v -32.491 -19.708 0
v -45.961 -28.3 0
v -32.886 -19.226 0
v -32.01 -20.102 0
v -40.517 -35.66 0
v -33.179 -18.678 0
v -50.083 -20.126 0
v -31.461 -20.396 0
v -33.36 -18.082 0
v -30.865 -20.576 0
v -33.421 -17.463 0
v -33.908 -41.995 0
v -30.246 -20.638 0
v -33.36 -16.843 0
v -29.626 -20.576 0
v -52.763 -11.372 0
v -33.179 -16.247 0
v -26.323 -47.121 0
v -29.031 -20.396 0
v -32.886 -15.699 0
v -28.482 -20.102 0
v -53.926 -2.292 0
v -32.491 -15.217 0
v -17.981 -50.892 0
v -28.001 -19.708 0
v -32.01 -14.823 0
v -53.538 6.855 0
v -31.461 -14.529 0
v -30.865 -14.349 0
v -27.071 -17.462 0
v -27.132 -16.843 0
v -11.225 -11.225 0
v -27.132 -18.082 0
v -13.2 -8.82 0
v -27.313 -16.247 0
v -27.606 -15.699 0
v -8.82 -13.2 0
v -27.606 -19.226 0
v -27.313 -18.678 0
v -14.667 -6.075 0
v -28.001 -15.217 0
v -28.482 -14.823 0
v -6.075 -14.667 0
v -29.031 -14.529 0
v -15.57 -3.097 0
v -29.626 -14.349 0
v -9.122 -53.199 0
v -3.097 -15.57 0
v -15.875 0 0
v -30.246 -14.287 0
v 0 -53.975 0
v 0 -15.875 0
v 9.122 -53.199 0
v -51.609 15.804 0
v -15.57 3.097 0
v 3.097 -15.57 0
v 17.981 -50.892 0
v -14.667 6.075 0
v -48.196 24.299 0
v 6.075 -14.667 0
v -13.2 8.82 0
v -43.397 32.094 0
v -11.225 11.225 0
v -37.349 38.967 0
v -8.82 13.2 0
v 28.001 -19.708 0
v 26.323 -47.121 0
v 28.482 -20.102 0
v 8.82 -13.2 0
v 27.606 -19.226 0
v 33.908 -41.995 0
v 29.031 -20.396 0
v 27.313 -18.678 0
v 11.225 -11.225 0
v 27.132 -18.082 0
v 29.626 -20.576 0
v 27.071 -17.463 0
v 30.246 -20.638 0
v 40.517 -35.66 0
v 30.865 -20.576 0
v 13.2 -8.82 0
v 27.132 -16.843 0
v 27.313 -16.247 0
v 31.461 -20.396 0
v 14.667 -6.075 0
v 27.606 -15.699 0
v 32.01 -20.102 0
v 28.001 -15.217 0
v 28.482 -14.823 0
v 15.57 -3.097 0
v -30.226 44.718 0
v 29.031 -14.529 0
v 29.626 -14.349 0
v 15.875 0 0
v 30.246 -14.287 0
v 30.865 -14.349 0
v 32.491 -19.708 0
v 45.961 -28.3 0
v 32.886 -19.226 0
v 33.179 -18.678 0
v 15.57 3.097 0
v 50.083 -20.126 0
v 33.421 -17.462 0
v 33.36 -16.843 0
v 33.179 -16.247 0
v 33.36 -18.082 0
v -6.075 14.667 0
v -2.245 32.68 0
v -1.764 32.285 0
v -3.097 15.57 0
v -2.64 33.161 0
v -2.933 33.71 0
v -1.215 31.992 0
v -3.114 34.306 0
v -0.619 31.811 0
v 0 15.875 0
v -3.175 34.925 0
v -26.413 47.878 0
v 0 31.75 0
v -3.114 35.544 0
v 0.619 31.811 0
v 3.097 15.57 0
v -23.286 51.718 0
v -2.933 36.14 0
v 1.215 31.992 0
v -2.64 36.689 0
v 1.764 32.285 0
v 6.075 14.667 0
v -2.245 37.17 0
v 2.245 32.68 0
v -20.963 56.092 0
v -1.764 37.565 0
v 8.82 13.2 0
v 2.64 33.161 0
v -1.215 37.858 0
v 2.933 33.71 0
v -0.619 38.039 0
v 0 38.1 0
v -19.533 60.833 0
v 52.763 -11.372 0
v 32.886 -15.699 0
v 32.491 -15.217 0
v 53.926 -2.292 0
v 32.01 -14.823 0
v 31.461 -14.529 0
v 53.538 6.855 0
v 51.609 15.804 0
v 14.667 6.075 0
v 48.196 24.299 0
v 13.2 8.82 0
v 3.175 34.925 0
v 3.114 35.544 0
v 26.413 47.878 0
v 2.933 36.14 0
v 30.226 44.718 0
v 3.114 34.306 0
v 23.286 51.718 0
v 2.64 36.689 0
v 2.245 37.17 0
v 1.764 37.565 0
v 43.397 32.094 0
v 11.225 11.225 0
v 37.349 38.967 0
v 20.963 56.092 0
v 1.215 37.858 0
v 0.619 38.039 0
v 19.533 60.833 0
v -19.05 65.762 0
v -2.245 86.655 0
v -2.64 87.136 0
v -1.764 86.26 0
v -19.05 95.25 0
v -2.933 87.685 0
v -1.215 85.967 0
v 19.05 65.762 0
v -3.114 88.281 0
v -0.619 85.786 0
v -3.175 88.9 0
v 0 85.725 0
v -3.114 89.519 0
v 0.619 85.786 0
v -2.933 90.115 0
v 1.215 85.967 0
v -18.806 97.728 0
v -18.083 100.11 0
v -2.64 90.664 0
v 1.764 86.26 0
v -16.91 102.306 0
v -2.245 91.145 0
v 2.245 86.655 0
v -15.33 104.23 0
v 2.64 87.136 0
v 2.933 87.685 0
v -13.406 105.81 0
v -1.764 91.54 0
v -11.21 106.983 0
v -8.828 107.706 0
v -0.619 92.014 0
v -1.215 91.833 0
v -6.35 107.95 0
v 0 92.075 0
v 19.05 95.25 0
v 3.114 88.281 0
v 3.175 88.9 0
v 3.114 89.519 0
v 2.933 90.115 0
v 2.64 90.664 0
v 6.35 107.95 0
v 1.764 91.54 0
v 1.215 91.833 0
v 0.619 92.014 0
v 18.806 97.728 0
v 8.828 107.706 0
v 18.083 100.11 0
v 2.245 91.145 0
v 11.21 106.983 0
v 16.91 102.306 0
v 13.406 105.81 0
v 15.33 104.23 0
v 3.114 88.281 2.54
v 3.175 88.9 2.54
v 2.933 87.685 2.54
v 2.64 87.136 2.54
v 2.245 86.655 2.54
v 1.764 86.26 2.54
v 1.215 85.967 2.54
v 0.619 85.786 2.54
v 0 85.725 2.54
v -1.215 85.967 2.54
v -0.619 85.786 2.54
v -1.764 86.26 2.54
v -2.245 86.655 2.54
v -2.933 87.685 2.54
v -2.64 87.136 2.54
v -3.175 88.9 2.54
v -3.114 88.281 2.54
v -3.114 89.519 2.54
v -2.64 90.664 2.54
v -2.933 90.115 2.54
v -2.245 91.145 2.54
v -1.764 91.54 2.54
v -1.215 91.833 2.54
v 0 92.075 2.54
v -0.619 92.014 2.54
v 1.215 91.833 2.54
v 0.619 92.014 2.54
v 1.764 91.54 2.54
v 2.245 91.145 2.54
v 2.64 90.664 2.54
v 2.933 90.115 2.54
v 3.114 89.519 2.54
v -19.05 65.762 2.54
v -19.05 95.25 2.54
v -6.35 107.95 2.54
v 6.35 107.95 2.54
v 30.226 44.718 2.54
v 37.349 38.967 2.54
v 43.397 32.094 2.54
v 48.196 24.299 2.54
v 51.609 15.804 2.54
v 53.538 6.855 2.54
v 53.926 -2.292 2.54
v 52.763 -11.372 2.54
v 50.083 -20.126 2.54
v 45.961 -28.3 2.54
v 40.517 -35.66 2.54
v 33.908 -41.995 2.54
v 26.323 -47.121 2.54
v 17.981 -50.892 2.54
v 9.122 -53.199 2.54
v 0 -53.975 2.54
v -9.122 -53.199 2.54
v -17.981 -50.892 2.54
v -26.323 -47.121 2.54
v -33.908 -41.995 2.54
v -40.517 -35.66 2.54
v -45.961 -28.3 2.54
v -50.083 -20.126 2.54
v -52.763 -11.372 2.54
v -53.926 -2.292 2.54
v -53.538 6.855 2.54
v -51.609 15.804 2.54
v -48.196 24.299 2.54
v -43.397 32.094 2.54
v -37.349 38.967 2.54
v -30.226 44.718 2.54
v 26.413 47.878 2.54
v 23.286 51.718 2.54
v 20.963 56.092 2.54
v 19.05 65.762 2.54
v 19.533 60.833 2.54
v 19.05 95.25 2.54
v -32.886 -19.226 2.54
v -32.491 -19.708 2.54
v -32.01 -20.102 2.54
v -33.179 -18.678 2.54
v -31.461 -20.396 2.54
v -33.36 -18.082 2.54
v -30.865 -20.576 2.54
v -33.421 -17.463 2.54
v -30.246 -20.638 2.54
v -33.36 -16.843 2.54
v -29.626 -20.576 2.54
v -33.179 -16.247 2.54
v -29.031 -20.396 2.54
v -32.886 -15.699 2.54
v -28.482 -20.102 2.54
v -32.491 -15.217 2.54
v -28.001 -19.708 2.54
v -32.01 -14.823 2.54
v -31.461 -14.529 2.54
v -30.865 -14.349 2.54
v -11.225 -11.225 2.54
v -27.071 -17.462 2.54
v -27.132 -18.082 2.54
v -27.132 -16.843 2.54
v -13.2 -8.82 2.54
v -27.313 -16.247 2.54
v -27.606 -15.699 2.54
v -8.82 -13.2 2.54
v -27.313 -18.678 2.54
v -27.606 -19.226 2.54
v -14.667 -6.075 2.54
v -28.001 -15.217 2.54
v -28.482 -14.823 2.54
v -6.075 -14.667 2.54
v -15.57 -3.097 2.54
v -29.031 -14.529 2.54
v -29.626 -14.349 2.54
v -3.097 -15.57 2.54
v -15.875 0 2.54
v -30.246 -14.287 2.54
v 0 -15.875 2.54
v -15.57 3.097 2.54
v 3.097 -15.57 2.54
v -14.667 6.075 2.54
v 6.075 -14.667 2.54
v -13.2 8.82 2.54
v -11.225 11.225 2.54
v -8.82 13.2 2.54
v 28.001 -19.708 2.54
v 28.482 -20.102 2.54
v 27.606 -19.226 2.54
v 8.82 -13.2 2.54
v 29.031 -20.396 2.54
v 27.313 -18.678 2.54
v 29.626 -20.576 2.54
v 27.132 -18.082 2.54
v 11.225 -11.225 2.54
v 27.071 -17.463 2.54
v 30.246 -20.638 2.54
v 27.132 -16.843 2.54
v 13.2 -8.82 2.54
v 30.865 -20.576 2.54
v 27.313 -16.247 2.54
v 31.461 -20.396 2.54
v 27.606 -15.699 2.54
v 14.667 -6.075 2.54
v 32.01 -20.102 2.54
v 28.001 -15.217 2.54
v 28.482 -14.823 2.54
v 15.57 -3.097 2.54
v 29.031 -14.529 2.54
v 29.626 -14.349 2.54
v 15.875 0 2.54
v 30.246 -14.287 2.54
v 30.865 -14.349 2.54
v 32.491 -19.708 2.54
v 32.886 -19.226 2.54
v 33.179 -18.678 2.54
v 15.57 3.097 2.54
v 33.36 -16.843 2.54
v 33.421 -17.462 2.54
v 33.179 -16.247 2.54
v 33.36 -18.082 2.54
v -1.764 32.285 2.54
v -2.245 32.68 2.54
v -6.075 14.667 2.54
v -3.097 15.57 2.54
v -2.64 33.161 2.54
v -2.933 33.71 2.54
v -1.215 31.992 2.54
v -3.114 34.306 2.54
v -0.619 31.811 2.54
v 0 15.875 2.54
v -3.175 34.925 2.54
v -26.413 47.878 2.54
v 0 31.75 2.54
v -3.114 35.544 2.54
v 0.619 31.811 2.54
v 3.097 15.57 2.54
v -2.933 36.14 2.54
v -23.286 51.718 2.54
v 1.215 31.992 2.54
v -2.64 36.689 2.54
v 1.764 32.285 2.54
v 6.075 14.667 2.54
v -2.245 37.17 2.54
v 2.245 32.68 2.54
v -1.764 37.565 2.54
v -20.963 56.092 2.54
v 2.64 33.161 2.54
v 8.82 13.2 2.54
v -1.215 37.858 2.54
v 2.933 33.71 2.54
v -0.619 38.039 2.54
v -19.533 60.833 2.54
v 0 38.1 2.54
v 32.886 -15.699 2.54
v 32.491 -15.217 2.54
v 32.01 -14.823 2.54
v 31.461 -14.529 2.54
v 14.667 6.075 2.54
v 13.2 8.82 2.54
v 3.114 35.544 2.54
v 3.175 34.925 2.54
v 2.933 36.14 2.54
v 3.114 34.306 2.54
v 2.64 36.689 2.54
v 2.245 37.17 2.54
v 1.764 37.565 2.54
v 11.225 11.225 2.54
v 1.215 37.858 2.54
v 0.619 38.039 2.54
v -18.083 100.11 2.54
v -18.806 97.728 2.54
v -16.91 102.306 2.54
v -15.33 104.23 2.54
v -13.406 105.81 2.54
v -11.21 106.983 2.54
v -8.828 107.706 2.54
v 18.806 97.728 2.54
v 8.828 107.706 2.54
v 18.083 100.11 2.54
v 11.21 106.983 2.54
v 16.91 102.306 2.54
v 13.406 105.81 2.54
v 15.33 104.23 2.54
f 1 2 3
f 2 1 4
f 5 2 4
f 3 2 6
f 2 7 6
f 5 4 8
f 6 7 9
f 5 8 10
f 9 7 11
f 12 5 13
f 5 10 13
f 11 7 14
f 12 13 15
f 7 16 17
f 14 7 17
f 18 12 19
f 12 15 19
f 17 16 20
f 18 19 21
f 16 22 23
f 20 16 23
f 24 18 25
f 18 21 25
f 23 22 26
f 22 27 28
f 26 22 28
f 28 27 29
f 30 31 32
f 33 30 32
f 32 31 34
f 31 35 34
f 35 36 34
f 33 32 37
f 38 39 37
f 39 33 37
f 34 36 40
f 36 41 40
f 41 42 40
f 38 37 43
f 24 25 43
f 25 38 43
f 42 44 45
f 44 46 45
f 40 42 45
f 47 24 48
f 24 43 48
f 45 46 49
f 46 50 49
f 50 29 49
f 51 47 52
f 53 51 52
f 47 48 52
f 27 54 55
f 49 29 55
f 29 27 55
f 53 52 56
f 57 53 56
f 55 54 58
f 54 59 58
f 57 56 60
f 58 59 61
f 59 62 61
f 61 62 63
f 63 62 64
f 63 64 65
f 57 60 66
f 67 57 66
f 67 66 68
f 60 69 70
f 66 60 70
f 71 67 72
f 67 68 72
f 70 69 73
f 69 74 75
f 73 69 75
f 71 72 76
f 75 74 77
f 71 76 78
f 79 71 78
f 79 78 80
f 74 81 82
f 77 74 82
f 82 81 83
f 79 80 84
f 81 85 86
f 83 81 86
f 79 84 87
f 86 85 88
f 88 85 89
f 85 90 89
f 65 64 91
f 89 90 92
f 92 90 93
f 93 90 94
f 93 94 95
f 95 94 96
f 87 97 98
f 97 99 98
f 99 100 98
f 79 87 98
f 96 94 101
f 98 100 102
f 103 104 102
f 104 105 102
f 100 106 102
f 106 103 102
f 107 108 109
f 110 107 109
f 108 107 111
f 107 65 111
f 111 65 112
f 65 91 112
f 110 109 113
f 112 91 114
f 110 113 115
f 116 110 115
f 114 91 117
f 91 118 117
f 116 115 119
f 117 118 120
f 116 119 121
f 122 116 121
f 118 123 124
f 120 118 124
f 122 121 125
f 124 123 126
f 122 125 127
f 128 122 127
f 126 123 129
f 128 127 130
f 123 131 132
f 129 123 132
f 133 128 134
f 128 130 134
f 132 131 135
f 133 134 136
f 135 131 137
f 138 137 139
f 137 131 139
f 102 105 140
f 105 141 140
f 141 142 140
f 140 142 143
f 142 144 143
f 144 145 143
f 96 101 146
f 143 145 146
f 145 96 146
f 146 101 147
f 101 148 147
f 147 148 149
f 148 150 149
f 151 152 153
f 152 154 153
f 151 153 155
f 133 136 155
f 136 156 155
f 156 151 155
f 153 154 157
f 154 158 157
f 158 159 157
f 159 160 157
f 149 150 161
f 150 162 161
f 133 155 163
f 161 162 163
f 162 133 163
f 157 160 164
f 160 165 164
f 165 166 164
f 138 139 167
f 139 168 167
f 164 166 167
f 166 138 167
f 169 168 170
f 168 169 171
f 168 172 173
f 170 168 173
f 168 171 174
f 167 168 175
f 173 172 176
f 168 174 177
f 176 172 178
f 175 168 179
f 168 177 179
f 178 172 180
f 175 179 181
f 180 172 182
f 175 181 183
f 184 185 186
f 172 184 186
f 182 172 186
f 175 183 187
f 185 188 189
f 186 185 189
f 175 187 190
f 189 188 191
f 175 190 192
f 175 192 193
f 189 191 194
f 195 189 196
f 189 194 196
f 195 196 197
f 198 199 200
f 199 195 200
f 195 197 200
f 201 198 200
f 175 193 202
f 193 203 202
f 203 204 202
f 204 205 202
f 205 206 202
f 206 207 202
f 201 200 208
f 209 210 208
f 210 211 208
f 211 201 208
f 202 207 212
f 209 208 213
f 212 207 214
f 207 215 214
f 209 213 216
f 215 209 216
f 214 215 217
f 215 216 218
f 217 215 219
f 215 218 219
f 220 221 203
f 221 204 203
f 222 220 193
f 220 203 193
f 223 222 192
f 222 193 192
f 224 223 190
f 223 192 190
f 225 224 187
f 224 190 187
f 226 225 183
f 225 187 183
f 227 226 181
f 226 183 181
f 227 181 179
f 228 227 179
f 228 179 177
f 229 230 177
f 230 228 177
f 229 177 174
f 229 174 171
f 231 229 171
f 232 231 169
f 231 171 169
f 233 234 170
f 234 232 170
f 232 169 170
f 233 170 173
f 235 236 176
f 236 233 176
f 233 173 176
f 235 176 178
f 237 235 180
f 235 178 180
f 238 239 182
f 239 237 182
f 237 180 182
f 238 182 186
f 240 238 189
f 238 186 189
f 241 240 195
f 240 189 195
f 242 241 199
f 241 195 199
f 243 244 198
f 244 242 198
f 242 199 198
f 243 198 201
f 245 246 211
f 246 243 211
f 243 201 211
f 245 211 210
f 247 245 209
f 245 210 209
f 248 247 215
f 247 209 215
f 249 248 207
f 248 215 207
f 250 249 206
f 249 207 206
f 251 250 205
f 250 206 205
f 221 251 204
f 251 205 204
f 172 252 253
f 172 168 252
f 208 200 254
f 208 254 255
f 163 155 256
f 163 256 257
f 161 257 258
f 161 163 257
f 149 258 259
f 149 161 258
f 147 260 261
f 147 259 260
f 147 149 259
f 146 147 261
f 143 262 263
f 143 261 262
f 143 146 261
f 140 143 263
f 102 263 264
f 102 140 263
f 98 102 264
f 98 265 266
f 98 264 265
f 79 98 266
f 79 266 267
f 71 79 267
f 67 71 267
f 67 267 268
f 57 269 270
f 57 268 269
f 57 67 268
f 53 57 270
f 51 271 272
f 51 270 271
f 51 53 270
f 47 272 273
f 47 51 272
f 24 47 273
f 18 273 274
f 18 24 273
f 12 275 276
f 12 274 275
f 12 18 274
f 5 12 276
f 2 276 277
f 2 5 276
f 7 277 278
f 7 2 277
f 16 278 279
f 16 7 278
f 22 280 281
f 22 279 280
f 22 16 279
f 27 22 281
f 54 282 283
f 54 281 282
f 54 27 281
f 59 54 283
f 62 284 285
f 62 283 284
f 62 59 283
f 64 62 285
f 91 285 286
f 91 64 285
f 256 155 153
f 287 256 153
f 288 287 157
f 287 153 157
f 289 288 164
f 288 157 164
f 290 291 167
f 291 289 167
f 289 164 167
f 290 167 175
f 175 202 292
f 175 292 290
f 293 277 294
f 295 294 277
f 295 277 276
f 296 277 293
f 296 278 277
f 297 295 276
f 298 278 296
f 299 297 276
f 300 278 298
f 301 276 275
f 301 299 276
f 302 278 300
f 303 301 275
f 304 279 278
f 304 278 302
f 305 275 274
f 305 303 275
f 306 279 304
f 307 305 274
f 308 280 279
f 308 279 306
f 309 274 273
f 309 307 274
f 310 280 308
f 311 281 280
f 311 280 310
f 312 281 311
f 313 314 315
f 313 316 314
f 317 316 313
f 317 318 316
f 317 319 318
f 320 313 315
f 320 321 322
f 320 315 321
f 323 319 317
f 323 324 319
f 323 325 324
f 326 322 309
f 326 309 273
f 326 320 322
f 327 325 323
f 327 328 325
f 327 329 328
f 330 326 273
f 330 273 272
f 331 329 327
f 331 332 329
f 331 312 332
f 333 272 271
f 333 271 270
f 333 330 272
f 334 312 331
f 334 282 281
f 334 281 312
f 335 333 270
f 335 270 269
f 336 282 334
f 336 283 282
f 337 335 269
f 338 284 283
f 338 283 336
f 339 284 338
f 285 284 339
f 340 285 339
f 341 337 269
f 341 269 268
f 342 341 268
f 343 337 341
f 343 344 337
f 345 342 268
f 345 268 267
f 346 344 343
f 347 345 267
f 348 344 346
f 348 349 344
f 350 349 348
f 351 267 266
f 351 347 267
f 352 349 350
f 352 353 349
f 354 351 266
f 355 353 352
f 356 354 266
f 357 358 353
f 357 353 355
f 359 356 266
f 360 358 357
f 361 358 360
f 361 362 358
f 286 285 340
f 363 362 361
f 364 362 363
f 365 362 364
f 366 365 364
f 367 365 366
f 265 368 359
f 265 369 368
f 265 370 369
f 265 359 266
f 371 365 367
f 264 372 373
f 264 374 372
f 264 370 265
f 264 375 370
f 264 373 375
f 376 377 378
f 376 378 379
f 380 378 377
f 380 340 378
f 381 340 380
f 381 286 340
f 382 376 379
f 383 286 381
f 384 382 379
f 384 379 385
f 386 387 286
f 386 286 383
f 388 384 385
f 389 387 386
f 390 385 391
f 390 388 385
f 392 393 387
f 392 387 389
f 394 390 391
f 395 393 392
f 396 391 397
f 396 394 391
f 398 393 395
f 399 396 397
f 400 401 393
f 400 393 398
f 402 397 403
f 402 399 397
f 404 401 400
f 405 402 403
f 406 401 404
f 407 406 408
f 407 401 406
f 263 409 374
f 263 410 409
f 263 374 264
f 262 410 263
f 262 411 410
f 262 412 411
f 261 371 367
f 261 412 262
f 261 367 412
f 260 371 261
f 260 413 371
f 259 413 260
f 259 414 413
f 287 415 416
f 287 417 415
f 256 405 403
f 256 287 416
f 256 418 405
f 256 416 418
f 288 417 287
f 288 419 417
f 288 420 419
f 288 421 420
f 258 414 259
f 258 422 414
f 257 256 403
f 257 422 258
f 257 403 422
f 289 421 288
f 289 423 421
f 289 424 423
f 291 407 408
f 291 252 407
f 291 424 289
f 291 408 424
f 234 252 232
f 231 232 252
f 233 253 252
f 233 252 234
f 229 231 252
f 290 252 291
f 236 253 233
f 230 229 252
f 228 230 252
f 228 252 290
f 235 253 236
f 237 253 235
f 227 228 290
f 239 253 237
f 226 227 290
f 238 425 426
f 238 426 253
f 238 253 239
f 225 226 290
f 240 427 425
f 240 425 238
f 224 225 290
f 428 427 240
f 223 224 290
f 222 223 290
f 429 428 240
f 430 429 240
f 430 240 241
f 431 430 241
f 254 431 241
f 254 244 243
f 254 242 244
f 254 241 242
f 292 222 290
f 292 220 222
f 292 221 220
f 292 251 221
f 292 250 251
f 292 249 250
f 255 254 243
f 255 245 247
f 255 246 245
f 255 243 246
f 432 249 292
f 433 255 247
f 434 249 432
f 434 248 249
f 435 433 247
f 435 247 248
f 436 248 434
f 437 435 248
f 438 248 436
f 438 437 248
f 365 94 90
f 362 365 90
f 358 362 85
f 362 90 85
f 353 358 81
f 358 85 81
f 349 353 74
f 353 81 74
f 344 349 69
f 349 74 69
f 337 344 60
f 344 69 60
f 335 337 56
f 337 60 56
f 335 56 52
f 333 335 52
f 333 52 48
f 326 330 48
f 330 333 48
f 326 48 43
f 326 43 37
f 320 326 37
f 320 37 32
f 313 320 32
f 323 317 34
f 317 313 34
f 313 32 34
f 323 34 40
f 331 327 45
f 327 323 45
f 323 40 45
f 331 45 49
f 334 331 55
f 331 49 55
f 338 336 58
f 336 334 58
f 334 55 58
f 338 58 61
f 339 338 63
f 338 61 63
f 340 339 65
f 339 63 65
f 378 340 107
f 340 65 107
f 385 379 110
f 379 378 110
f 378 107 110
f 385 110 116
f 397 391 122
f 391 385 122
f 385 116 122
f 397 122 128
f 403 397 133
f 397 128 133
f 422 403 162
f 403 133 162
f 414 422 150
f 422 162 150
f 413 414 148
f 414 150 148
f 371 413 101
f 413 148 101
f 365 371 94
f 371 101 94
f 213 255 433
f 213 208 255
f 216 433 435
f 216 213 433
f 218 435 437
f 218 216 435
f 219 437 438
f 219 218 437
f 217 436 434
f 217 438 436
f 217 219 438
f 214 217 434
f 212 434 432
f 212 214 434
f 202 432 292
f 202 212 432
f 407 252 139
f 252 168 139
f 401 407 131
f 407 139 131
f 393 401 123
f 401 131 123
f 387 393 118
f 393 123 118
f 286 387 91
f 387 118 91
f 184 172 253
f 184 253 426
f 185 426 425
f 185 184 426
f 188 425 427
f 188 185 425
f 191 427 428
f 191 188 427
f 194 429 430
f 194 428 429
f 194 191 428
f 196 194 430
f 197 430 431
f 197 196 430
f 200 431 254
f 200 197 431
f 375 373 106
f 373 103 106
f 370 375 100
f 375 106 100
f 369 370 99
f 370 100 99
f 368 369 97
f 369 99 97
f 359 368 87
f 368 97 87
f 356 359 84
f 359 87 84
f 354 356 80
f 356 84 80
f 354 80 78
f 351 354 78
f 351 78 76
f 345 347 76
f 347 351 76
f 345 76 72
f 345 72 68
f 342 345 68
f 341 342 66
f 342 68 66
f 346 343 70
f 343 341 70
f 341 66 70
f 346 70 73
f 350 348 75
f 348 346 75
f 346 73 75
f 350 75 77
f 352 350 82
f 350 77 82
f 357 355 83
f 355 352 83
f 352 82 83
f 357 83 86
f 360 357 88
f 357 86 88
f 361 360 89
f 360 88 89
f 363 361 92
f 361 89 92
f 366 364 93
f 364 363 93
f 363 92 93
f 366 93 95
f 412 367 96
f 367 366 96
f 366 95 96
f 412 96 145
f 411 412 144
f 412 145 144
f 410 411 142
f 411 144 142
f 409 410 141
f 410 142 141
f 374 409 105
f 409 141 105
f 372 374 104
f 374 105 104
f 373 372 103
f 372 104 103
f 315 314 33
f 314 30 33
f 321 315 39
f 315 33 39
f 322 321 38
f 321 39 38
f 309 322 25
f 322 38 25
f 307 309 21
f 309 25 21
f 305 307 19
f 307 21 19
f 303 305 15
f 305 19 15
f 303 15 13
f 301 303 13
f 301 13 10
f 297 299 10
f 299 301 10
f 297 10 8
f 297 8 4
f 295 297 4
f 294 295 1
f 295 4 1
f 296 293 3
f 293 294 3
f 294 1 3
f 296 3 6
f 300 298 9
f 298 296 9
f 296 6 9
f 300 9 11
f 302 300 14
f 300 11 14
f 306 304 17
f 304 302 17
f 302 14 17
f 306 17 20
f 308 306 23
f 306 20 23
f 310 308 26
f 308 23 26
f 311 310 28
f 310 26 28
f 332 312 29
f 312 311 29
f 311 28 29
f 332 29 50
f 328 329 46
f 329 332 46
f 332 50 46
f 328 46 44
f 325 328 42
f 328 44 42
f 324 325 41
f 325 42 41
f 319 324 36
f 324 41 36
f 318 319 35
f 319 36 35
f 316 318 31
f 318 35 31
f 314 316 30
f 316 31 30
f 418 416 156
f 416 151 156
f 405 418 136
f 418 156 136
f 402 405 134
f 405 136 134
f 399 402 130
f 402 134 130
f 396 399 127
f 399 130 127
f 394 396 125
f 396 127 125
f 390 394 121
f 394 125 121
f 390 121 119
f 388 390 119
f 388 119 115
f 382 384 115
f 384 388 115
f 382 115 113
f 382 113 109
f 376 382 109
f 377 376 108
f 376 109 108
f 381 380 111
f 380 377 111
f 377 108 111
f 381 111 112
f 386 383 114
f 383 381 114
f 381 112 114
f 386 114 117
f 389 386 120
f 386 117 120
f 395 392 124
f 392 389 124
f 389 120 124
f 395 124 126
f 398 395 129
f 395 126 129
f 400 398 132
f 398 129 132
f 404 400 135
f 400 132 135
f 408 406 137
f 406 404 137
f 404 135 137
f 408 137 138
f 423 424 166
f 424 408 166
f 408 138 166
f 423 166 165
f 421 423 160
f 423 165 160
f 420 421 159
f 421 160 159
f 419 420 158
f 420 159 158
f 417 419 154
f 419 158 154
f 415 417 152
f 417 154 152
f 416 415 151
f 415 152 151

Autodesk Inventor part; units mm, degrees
ref_plane "YZ Plane" through (0, 0, 0) normal (1, 0, 0) x (0, 1, 0)
ref_plane "XZ Plane" through (0, 0, 0) normal (0, 1, 0) x (-1, 0, 0)
ref_plane "XY Plane" through (0, 0, 0) normal (0, 0, 1) x (1, 0, 0)
sketch "Sketch1" plane through (0, 0, 0) normal (0, 0, 1) x (1, 0, 0)
  circle A0 centre (0, 0) radius 15.875
  arc A1 (-30.226, 44.7179) -> (30.226, 44.7179) centre (0, 0) ccw
  circle A2 centre (0, 0) radius 22.5683 construction
  circle A3 centre (0, 0) radius 34.925 construction
  circle A4 centre (0, 34.925) radius 3.175
  line L0 (0, 41.275) -> (0, 0) construction
  line L1 (-19.05, 65.7616) -> (-19.05, 95.25)
  line L2 (-6.35, 107.95) -> (6.35, 107.95)
  line L3 (19.05, 95.25) -> (19.05, 65.7616)
  line L4 (0, 0) -> (0, 107.95) construction
  circle A5 centre (0, 88.9) radius 3.175
  circle A6 centre (-30.2459, -17.4625) radius 3.175
  circle A7 centre (30.2459, -17.4625) radius 3.175
  arc A8 (-30.226, 44.7179) -> (-19.05, 65.7616) centre (-44.45, 65.7616) ccw
  arc A9 (19.05, 65.7616) -> (30.226, 44.7179) centre (44.45, 65.7616) ccw
  arc A10 (-6.35, 107.95) -> (-19.05, 95.25) centre (-6.35, 95.25) ccw
  arc A11 (19.05, 95.25) -> (6.35, 107.95) centre (6.35, 95.25) ccw
  point P0 (-19.05, 107.95)
  point P1 (19.05, 107.95)
  point P2 (19.05, 50.5015)
  point P3 (-19.05, 50.5015)
  dimension "d0" = 107.95
  dimension "d2" = 31.75
  dimension "d6" = 6.35
  dimension "d14" = 19.05
  dimension "d15" = 6.35
  dimension "d16" = 19.05
  dimension "d18" = 88.9
  dimension "d22" = 360
  dimension "d26" = 25.4
  dimension "d29" = 12.7
  dimension "d30" = 19.05
extrude "Extrusion1" add sketch "Sketch1" along normal blind 2.54
properties part number "door_clamp"
